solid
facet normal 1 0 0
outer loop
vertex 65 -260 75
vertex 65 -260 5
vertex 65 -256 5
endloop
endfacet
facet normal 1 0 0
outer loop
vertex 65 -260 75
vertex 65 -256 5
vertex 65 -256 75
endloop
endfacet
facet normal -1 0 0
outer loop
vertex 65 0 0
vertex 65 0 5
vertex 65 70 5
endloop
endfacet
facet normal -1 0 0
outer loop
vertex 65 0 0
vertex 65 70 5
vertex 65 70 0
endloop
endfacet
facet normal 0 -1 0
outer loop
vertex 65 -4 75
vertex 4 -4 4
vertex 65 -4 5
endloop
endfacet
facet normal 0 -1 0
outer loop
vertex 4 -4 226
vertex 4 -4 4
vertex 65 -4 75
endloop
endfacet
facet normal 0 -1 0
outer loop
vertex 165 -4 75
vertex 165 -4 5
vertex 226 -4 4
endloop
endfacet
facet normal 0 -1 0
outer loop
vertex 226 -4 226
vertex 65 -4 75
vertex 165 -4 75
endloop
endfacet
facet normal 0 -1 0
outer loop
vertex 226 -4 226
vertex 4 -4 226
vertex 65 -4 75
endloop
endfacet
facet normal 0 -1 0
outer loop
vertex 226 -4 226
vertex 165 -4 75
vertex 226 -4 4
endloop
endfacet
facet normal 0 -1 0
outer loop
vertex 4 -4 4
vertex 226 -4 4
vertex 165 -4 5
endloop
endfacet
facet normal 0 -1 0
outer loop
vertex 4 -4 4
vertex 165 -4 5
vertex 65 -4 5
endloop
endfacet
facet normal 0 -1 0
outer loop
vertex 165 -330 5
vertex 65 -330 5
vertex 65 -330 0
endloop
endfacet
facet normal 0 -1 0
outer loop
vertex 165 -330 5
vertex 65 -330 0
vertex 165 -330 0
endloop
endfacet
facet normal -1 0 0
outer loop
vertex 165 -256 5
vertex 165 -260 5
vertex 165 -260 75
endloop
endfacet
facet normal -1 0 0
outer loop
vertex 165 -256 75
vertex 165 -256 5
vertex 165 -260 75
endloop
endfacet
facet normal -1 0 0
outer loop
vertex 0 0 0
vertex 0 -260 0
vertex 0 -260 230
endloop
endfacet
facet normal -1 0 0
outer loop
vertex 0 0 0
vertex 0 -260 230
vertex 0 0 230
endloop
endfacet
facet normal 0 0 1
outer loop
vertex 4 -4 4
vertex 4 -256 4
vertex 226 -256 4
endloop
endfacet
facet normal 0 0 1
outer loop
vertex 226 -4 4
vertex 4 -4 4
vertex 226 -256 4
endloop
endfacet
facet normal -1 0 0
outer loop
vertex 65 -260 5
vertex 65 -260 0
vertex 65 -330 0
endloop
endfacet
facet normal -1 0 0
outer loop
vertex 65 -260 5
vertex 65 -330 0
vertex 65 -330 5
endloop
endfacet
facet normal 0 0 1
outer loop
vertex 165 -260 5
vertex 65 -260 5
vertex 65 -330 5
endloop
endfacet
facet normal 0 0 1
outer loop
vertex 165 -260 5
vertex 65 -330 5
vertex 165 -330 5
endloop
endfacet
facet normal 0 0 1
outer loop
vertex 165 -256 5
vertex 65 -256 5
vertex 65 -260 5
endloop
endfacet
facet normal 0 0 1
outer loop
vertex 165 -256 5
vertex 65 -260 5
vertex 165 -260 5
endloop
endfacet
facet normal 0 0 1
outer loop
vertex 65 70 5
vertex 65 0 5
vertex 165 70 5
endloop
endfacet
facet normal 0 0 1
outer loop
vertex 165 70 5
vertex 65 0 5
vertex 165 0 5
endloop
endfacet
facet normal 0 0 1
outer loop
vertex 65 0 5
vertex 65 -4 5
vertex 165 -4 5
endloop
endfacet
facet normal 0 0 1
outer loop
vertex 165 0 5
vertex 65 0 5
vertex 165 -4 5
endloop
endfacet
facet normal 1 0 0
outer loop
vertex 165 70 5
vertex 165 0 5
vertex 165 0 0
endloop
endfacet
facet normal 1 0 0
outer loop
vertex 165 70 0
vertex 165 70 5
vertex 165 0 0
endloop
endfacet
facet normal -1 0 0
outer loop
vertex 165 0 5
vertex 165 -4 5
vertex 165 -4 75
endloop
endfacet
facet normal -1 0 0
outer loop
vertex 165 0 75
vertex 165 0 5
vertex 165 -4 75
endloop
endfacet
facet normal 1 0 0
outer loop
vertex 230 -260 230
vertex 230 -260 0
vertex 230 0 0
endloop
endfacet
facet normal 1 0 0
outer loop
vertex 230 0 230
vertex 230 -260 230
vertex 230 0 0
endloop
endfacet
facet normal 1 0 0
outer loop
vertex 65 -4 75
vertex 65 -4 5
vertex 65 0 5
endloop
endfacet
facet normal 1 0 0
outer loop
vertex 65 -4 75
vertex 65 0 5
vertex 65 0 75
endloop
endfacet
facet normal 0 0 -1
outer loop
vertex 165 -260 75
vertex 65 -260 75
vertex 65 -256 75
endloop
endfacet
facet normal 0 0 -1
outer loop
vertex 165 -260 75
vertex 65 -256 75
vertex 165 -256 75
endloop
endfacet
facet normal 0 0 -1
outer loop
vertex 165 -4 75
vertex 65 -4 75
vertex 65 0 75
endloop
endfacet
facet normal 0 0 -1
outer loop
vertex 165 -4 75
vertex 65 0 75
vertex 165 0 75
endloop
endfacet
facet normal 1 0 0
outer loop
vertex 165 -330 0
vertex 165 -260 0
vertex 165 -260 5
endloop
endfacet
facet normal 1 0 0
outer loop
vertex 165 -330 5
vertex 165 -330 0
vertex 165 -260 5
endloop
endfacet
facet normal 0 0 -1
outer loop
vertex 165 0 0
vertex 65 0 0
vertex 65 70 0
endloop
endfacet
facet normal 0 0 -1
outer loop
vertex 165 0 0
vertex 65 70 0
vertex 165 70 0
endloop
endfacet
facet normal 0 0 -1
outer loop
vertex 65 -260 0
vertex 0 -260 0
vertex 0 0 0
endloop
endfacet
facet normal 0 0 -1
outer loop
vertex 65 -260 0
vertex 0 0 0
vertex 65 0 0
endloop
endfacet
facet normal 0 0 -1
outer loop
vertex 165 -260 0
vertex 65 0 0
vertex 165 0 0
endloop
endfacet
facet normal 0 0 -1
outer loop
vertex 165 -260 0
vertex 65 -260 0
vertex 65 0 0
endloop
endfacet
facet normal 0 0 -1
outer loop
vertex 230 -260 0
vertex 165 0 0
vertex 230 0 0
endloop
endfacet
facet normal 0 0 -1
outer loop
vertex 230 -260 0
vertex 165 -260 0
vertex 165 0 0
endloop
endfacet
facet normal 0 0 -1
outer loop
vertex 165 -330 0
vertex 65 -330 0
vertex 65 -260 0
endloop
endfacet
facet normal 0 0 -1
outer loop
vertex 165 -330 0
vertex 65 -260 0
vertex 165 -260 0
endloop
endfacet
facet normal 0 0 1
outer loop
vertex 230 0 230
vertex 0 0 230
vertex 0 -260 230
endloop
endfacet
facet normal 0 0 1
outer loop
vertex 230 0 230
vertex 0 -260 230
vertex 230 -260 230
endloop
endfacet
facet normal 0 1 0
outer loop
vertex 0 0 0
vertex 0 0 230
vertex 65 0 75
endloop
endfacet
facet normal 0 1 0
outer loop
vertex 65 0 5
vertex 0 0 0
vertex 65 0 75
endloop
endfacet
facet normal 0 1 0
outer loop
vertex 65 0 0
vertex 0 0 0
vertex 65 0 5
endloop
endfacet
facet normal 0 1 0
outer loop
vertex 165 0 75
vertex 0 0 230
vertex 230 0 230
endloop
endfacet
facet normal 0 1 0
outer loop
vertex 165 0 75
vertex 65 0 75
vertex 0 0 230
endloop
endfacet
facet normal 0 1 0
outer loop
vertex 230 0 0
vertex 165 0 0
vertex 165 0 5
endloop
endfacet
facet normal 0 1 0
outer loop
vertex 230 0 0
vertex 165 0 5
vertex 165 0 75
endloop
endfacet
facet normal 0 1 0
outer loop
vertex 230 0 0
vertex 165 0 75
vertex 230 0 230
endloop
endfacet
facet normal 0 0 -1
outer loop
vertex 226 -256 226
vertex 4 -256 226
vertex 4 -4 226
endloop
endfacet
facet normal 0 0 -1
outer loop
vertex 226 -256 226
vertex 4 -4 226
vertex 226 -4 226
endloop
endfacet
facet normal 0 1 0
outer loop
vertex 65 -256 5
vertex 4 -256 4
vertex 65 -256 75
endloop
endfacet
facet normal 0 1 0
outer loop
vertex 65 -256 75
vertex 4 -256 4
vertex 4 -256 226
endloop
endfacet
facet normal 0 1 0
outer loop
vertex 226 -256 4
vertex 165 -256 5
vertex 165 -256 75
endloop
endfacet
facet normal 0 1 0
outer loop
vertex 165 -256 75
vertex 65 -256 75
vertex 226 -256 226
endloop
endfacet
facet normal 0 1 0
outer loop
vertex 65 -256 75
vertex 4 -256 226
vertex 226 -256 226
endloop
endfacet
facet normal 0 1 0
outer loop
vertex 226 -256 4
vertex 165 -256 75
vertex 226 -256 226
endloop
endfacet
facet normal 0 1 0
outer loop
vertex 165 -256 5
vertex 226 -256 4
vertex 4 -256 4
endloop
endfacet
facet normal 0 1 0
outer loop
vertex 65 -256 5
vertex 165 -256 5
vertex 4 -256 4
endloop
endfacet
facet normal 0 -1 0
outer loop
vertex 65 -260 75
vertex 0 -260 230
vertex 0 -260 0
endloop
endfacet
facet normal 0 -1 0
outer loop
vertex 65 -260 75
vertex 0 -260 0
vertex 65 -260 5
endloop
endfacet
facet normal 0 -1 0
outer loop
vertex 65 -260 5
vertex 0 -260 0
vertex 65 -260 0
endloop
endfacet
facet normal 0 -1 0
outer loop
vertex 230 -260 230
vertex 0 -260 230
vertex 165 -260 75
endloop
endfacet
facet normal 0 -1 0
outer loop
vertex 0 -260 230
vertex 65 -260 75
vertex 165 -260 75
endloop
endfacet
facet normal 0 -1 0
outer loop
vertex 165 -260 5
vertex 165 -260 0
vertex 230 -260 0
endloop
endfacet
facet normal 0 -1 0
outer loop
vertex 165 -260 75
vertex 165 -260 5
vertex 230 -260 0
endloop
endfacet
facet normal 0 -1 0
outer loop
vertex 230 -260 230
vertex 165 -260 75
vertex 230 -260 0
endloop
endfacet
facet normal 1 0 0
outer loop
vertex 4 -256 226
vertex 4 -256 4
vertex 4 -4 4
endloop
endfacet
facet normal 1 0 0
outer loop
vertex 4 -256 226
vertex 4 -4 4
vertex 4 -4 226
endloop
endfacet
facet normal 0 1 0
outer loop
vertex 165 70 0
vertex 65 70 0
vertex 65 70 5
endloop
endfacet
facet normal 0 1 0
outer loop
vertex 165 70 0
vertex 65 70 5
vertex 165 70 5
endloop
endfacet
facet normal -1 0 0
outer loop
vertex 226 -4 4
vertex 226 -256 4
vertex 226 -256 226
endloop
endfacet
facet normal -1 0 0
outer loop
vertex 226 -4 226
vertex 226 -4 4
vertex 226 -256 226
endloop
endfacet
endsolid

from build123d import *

# Parameters (mm, degrees)
ESQUISSE1_W             = 230
ESQUISSE1_H             = 260
BOSS_EXTRU_1_DEPTH      = 230
ESQUISSE2_W             = 222
ESQUISSE2_H             = 222
ENL_V_MAT_EXTRU_1_DEPTH = 256
ESQUISSE3_W             = 230
ESQUISSE3_H             = 230
BOSS_EXTRU_2_DEPTH      = 4
ESQUISSE4_W             = 100
ESQUISSE4_H             = 70
ENL_V_MAT_EXTRU_2_DEPTH = 456
ESQUISSE5_W             = 100
ESQUISSE5_H             = 5
BOSS_EXTRU_3_DEPTH      = 70
ESQUISSE6_W             = 100
ESQUISSE6_H             = 5
BOSS_EXTRU_4_DEPTH      = 70


with BuildPart() as part:
    # Esquisse1 → Boss.-Extru.1 (new body)
    with BuildSketch(Plane.XY):
        with Locations((115, -130)):
            Rectangle(ESQUISSE1_W, ESQUISSE1_H)
    extrude(amount=BOSS_EXTRU_1_DEPTH)

    # Esquisse2 → Enlèv. mat.-Extru.1 (cut)
    with BuildSketch(Plane.XZ.offset(260)):
        with Locations((115, 115)):
            Rectangle(ESQUISSE2_W, ESQUISSE2_H)
    extrude(amount=-ENL_V_MAT_EXTRU_1_DEPTH, mode=Mode.SUBTRACT)

    # Esquisse3 → Boss.-Extru.2 (add)
    with BuildSketch(Plane.XZ.offset(260)):
        with Locations((115, 115)):
            Rectangle(ESQUISSE3_W, ESQUISSE3_H)
    extrude(amount=-BOSS_EXTRU_2_DEPTH)

    # Esquisse4 → Enlèv. mat.-Extru.2 (cut)
    with BuildSketch(Plane.XZ.offset(260)):
        with Locations((115, 40)):
            Rectangle(ESQUISSE4_W, ESQUISSE4_H)
    extrude(amount=-ENL_V_MAT_EXTRU_2_DEPTH, mode=Mode.SUBTRACT)

    # Esquisse5 → Boss.-Extru.3 (add)
    with BuildSketch(Plane.XZ.offset(260)):
        with Locations((115, 2.5)):
            Rectangle(ESQUISSE5_W, ESQUISSE5_H)
    extrude(amount=BOSS_EXTRU_3_DEPTH)

    # Esquisse6 → Boss.-Extru.4 (add)
    with BuildSketch(Plane(origin=(0, 0, 0), x_dir=(1, 0, 0), z_dir=(0, 1, 0))):
        with Locations((115, -2.5)):
            Rectangle(ESQUISSE6_W, ESQUISSE6_H)
    extrude(amount=BOSS_EXTRU_4_DEPTH)


solid = part.part
